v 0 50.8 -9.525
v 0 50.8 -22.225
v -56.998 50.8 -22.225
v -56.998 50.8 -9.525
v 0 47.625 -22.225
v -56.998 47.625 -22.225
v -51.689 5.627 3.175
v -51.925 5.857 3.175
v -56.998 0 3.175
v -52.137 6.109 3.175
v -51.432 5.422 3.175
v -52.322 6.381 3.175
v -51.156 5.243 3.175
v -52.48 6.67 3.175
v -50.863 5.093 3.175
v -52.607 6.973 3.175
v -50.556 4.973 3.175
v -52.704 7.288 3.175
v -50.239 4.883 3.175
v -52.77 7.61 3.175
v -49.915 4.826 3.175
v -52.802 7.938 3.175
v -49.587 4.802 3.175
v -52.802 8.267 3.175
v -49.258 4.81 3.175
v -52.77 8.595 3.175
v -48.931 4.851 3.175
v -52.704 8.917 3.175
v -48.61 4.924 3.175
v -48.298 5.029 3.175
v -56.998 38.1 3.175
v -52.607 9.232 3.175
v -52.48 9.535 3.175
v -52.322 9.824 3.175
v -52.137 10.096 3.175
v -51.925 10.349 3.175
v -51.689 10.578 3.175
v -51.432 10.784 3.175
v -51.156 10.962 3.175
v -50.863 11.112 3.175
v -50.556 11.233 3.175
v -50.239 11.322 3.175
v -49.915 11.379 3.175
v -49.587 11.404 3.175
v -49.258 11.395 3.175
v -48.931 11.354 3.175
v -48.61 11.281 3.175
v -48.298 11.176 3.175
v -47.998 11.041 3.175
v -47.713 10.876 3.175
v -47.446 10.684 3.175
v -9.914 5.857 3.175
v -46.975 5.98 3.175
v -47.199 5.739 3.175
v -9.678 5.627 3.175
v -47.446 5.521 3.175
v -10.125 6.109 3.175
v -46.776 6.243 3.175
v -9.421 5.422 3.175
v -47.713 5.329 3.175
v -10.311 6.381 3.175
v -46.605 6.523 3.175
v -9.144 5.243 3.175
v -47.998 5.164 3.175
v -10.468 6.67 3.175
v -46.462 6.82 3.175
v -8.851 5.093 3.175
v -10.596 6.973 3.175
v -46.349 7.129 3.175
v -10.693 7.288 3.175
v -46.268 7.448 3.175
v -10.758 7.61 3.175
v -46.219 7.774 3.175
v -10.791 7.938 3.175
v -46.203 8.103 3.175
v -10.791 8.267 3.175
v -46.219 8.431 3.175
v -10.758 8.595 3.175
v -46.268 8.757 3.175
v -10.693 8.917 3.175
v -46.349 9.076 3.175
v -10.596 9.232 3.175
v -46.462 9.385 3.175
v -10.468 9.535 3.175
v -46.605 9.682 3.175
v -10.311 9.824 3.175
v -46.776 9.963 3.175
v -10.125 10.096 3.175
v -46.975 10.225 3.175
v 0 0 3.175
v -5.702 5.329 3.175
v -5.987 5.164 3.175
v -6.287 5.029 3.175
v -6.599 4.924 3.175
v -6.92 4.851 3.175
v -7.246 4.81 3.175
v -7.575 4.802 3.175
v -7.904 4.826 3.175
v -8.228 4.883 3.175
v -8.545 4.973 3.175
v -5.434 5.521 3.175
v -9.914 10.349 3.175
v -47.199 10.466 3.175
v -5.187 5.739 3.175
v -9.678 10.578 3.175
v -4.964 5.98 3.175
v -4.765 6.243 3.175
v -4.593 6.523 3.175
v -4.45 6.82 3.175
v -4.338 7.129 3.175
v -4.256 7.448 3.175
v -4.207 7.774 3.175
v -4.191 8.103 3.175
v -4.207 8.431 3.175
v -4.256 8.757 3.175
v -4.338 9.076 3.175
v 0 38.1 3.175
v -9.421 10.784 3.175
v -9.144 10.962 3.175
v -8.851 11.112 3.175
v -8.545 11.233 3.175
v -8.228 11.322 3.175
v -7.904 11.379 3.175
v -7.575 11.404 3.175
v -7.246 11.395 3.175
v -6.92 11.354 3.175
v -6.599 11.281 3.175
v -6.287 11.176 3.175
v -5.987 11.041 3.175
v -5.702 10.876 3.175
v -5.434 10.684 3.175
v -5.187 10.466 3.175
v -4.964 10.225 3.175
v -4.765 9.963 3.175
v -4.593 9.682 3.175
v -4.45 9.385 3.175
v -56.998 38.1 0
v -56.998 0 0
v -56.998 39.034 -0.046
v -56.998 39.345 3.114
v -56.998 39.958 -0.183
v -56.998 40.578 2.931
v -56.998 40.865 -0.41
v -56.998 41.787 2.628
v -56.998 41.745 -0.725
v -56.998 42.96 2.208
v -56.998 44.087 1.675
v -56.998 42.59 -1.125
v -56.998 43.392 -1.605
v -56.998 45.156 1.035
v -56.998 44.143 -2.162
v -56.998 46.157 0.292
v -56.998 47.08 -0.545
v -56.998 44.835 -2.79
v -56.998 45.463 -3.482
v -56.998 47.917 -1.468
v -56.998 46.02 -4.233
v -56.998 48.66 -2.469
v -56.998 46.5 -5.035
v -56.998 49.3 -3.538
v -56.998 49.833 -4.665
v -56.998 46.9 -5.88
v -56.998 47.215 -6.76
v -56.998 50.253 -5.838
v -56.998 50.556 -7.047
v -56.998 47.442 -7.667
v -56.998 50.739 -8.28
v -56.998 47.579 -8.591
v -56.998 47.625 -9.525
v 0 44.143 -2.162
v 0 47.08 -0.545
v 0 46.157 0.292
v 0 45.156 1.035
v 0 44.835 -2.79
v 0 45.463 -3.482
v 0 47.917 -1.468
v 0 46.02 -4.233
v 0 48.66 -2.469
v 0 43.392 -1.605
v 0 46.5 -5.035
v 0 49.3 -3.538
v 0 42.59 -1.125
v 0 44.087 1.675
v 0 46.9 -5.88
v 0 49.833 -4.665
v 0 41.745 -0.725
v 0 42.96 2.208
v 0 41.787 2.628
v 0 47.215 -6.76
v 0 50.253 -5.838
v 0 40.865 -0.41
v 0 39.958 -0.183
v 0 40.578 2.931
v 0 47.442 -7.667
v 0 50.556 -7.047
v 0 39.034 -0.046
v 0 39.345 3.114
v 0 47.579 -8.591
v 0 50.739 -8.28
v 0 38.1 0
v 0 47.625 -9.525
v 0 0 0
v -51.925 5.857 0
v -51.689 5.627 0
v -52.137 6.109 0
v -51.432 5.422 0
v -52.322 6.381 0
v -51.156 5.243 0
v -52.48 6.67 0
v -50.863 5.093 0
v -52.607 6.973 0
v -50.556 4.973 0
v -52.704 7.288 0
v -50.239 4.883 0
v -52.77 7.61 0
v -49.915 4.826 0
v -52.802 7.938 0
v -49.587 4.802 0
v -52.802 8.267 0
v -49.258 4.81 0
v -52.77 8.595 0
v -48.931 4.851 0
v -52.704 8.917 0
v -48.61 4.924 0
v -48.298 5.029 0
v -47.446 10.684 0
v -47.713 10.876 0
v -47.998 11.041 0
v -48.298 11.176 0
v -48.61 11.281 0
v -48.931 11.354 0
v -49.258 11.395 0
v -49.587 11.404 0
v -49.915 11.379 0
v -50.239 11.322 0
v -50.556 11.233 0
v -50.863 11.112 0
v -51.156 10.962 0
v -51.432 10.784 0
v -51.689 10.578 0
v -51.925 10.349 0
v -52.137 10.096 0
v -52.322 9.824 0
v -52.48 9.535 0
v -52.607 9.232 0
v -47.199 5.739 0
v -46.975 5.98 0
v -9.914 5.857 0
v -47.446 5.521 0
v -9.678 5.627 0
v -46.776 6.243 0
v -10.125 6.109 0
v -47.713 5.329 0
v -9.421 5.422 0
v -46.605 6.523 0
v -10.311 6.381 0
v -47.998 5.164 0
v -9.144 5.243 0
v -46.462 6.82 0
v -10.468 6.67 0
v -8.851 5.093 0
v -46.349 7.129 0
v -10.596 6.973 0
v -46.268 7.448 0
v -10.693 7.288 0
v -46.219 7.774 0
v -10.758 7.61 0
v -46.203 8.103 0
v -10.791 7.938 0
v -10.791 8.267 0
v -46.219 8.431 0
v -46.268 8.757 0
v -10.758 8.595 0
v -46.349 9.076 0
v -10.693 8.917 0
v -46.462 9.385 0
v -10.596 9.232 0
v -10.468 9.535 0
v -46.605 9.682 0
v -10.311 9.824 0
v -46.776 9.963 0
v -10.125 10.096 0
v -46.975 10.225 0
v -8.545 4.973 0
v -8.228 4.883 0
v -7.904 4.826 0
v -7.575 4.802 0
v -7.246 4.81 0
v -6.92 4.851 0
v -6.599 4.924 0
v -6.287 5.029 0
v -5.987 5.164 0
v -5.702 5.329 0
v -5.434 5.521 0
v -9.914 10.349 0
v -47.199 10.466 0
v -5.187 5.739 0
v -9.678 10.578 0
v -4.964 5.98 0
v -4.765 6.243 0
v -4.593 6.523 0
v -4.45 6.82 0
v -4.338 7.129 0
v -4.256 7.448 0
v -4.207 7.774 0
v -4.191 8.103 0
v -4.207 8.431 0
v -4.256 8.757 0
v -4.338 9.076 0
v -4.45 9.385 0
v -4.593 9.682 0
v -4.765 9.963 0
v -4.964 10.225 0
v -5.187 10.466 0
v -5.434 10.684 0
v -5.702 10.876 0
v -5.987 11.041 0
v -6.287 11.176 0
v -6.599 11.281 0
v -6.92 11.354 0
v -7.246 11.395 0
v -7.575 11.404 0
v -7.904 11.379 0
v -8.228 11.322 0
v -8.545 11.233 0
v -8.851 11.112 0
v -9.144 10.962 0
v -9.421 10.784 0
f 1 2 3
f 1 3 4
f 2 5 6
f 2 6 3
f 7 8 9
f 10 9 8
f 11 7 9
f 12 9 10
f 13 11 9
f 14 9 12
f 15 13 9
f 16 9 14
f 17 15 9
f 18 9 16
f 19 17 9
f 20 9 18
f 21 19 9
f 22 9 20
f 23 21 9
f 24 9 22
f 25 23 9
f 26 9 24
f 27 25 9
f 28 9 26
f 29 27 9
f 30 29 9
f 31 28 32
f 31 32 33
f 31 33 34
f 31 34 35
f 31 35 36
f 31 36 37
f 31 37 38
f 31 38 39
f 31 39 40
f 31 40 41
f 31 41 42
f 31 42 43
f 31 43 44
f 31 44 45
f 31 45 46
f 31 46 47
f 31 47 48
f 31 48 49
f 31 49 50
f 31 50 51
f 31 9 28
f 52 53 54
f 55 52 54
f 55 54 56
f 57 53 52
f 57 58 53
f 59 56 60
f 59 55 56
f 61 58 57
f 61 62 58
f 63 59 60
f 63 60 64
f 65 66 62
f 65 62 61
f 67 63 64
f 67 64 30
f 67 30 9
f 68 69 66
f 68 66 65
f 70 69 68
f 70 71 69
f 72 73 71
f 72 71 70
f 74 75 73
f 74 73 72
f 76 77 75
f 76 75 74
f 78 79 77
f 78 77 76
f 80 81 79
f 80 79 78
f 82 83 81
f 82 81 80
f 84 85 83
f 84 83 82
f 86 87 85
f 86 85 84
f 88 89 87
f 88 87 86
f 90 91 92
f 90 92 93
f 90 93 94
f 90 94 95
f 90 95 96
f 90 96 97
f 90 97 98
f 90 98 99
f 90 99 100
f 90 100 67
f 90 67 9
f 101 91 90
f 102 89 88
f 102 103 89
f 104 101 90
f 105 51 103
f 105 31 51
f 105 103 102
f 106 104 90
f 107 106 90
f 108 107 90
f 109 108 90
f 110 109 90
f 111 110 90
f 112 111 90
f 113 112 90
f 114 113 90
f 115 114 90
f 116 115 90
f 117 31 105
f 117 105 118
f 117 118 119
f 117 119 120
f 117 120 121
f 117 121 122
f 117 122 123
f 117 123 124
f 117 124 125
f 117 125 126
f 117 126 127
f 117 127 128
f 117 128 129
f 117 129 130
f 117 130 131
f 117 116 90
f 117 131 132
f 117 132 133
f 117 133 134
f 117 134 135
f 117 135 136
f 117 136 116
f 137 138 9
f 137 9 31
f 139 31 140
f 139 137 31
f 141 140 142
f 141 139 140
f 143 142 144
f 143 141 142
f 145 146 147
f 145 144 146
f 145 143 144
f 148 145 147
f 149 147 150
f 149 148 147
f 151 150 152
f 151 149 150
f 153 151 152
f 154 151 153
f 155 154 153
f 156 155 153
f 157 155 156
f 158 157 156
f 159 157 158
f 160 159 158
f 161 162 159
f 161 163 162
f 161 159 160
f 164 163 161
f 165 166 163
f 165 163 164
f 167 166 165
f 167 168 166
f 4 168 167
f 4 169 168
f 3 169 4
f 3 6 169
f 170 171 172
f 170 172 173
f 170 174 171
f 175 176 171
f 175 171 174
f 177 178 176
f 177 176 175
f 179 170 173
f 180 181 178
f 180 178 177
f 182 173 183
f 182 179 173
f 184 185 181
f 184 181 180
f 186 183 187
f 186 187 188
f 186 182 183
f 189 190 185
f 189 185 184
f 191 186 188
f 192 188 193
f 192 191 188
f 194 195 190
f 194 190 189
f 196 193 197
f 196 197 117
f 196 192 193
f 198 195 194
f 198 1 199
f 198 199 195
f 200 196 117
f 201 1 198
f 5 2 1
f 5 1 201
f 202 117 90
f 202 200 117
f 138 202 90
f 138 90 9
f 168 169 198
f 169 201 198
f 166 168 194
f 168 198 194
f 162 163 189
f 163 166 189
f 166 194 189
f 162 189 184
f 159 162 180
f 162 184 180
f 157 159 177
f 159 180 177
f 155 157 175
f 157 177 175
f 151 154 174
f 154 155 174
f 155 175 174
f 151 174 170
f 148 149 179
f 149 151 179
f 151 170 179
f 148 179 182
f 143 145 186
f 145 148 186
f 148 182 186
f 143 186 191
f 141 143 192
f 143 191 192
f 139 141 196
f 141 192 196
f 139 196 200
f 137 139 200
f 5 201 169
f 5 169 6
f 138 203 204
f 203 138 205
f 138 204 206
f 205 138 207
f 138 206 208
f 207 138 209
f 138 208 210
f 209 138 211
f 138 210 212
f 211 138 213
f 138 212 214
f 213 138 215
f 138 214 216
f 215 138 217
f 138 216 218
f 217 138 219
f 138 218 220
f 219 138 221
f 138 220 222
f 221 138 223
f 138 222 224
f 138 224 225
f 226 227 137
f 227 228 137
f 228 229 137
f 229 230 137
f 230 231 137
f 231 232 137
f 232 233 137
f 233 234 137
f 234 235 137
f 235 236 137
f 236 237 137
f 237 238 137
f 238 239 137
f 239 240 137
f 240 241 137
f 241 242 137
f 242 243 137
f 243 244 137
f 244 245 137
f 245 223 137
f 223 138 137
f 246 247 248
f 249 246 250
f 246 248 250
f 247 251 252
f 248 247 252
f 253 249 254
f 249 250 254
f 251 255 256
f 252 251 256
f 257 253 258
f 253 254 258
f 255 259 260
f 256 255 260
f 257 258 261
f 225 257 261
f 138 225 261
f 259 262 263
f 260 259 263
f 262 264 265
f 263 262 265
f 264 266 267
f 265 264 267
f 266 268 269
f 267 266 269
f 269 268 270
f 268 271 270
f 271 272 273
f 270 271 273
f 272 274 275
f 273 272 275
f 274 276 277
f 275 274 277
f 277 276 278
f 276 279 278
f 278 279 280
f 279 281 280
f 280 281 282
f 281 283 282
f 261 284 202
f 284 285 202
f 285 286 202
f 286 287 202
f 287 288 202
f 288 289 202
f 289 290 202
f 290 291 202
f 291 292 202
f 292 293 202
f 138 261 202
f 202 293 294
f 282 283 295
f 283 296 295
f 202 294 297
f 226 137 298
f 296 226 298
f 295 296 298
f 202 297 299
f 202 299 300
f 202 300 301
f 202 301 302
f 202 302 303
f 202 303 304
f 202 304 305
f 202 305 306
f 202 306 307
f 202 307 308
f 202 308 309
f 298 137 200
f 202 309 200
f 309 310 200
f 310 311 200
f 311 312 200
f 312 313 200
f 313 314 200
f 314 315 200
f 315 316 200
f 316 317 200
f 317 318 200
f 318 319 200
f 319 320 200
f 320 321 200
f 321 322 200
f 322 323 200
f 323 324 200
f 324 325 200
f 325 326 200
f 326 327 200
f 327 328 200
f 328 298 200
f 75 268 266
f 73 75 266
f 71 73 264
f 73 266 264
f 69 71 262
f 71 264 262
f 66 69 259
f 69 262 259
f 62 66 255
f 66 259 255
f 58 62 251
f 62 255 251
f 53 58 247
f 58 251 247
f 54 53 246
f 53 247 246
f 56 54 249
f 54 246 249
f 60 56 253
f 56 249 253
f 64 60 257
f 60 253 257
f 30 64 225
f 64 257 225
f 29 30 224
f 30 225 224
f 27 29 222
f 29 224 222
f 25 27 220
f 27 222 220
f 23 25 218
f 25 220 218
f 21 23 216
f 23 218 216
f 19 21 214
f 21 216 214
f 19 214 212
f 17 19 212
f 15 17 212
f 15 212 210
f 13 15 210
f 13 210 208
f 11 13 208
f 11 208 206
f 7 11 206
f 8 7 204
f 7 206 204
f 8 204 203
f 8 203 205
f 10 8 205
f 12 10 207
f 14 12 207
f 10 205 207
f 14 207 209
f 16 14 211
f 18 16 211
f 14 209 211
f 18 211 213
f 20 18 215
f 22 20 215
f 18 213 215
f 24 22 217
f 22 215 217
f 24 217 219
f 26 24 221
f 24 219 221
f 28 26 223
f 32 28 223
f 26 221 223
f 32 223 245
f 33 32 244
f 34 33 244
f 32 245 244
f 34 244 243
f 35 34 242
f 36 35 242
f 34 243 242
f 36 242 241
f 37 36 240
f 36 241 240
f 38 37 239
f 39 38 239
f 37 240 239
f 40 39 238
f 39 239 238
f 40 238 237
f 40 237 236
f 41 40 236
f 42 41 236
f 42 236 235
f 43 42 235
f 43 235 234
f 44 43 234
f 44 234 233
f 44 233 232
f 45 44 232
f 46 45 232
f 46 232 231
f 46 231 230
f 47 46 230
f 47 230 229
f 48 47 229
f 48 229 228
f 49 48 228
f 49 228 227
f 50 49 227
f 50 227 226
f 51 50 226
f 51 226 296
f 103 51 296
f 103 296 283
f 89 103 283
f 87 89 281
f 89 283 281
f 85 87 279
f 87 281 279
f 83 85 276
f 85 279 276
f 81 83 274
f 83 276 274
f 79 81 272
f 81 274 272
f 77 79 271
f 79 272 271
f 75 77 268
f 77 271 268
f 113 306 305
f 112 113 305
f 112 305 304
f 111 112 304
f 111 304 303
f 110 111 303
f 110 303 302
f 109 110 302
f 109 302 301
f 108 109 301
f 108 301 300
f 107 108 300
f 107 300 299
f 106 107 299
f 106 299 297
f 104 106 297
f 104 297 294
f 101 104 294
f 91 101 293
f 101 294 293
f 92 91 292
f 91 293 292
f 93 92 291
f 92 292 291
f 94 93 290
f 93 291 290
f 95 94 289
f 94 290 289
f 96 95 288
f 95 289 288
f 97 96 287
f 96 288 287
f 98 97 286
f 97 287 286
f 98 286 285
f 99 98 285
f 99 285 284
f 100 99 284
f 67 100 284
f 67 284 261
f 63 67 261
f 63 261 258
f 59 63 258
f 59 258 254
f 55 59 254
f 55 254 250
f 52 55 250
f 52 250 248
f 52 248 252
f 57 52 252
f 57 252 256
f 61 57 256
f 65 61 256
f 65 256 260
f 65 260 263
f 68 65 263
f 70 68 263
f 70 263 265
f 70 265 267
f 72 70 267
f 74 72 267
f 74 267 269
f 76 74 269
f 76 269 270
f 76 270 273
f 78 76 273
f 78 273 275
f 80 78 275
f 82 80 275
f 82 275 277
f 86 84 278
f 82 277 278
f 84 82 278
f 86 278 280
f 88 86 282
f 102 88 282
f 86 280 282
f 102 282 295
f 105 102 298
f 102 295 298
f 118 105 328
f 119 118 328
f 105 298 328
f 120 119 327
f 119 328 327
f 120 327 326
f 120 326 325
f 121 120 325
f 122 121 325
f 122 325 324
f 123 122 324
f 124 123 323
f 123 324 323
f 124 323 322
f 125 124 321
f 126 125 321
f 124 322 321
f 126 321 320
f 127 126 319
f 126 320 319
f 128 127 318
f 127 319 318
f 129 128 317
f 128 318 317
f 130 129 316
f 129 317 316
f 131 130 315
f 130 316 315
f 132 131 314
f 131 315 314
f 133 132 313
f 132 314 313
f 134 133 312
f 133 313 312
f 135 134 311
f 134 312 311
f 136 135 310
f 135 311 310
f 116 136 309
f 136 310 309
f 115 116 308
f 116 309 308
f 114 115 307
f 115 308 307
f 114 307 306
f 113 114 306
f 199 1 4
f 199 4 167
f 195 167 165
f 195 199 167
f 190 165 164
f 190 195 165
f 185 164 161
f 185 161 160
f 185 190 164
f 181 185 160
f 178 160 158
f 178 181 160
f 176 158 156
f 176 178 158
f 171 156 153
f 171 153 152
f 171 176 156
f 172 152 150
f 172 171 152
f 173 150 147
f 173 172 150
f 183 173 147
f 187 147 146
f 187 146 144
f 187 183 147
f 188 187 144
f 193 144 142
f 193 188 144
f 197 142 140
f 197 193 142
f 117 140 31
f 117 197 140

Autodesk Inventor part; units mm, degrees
ref_plane "YZ Plane" through (0, 0, 0) normal (1, 0, 0) x (0, 1, 0)
ref_plane "XZ Plane" through (0, 0, 0) normal (0, 1, 0) x (-1, 0, 0)
ref_plane "XY Plane" through (0, 0, 0) normal (0, 0, 1) x (1, 0, 0)
sketch "Sketch1" plane through (0, 0, 0) normal (0, 0, 1) x (1, 0, 0)
  line L0 (0, 0) -> (-56.9976, 0)
  line L1 (-56.9976, 0) -> (-56.9976, 38.1)
  line L2 (-56.9976, 38.1) -> (0, 38.1)
  line L3 (0, 38.1) -> (0, 0)
  line L4 (0, 38.1) -> (-7.493, 38.1)
  line L5 (-7.493, 38.1) -> (-7.493, 8.1026)
  line L6 (-56.9976, 38.1) -> (-49.5046, 38.1)
  line L7 (-49.5046, 38.1) -> (-49.5046, 8.1026)
  circle A0 centre (-49.5046, 8.1026) radius 3.302
  circle A1 centre (-7.493, 8.1026) radius 3.302
  dimension "d1" = 56.9976
  dimension "d2" = 38.1
  dimension "d3" = 7.493
  dimension "d4" = 29.9974
  dimension "d5" = 7.493
  dimension "d6" = 6.604
  dimension "d7" = 6.604
extrude "Plate1" add sketch "Sketch1" along normal blind 3.175
sketch "Sketch2" plane through (0, 47.625, -9.525) normal (0, 1, 0) x (-1, 0, 0)
  line L0 (56.9976, 0) -> (0, 0)
  line L1 (0, 0) -> (0, -12.7)
  line L2 (0, -12.7) -> (56.9976, -12.7)
  line L3 (56.9976, -12.7) -> (56.9976, 0)
edge flange "Flange1" height 25.4 angle 90 thickness 3.175 bend radius 9.525 thickness toward (0, 1, 0) relief tear relief width 3.175 relief depth 1.5875 edges at (-53.2511, 38.1, 0) wall of the first edge with corners at (-56.9976, 47.625, -9.525) (0, 47.625, -9.525) (0, 47.625, -22.225) (-56.9976, 47.625, -22.225)
bend "Bend1"
corner "Corner1"
sketch "Sketch3" plane through (-56.9976, 50.8, -22.225) normal (0, 1, 0) x (1, 0, 0)
  line L0 (0, -12.7) -> (56.9976, -12.7) projected
  line L1 (56.9976, 0) -> (56.9976, -12.7) projected
  line L2 (0, 0) -> (56.9976, 0) projected
  line L3 (0, -12.7) -> (0, 0) projected
  point P0 (56.9976, -22.225)
sketch "Sketch4" plane through (-56.9976, 50.8, -22.225) normal (0, 1, 0) x (1, 0, 0)
  line L0 (0, -12.7) -> (56.9976, -12.7) projected
  line L1 (56.9976, 0) -> (56.9976, -12.7) projected
  line L2 (0, 0) -> (56.9976, 0) projected
  line L3 (0, -12.7) -> (0, 0) projected
  point P0 (56.9976, -22.225)
sketch "Sketch5" plane through (-56.9976, 50.8, -22.225) normal (0, 1, 0) x (1, 0, 0)
  line L0 (0, -12.7) -> (56.9976, -12.7) projected
  line L1 (56.9976, 0) -> (56.9976, -12.7) projected
  line L2 (0, 0) -> (56.9976, 0) projected
  line L3 (0, -12.7) -> (0, 0) projected
  point P0 (56.9976, -22.225)
sketch "Sketch6" plane through (-56.9976, 50.8, -22.225) normal (0, 1, 0) x (1, 0, 0)
  line L0 (0, -12.7) -> (56.9976, -12.7) projected
  line L1 (56.9976, 0) -> (56.9976, -12.7) projected
  line L2 (0, 0) -> (56.9976, 0) projected
  line L3 (0, -12.7) -> (0, 0) projected
  point P0 (56.9976, -22.225)
equation "\"d9\" = BendReliefWidth"
equation "\"d10\" = BendReliefDepth"
equation "\"d11\" = MinimumRemnant"
equation "\"d12\" = BendRadius"
equation "\"d16\" = CornerReliefSize"
equation "\"d17\" = GapSize"
equation "\"d18\" = JacobiRadiusSize"
equation "\"BendRadius\" = Thickness"
equation "\"BendReliefWidth\" = Thickness"
equation "\"BendReliefDepth\" = 0.5 * Thickness"
equation "\"CornerReliefSize\" = 4 * Thickness"
equation "\"MinimumRemnant\" = 2 * Thickness"
equation "\"TransitionRadius\" = BendRadius"
equation "\"JacobiRadiusSize\" = BendRadius"
equation "\"GapSize\" = Thickness"
equation "\"d8\" = BendRadius"
equation "\"Thickness\" = 3.175"
properties part number "endstop"
